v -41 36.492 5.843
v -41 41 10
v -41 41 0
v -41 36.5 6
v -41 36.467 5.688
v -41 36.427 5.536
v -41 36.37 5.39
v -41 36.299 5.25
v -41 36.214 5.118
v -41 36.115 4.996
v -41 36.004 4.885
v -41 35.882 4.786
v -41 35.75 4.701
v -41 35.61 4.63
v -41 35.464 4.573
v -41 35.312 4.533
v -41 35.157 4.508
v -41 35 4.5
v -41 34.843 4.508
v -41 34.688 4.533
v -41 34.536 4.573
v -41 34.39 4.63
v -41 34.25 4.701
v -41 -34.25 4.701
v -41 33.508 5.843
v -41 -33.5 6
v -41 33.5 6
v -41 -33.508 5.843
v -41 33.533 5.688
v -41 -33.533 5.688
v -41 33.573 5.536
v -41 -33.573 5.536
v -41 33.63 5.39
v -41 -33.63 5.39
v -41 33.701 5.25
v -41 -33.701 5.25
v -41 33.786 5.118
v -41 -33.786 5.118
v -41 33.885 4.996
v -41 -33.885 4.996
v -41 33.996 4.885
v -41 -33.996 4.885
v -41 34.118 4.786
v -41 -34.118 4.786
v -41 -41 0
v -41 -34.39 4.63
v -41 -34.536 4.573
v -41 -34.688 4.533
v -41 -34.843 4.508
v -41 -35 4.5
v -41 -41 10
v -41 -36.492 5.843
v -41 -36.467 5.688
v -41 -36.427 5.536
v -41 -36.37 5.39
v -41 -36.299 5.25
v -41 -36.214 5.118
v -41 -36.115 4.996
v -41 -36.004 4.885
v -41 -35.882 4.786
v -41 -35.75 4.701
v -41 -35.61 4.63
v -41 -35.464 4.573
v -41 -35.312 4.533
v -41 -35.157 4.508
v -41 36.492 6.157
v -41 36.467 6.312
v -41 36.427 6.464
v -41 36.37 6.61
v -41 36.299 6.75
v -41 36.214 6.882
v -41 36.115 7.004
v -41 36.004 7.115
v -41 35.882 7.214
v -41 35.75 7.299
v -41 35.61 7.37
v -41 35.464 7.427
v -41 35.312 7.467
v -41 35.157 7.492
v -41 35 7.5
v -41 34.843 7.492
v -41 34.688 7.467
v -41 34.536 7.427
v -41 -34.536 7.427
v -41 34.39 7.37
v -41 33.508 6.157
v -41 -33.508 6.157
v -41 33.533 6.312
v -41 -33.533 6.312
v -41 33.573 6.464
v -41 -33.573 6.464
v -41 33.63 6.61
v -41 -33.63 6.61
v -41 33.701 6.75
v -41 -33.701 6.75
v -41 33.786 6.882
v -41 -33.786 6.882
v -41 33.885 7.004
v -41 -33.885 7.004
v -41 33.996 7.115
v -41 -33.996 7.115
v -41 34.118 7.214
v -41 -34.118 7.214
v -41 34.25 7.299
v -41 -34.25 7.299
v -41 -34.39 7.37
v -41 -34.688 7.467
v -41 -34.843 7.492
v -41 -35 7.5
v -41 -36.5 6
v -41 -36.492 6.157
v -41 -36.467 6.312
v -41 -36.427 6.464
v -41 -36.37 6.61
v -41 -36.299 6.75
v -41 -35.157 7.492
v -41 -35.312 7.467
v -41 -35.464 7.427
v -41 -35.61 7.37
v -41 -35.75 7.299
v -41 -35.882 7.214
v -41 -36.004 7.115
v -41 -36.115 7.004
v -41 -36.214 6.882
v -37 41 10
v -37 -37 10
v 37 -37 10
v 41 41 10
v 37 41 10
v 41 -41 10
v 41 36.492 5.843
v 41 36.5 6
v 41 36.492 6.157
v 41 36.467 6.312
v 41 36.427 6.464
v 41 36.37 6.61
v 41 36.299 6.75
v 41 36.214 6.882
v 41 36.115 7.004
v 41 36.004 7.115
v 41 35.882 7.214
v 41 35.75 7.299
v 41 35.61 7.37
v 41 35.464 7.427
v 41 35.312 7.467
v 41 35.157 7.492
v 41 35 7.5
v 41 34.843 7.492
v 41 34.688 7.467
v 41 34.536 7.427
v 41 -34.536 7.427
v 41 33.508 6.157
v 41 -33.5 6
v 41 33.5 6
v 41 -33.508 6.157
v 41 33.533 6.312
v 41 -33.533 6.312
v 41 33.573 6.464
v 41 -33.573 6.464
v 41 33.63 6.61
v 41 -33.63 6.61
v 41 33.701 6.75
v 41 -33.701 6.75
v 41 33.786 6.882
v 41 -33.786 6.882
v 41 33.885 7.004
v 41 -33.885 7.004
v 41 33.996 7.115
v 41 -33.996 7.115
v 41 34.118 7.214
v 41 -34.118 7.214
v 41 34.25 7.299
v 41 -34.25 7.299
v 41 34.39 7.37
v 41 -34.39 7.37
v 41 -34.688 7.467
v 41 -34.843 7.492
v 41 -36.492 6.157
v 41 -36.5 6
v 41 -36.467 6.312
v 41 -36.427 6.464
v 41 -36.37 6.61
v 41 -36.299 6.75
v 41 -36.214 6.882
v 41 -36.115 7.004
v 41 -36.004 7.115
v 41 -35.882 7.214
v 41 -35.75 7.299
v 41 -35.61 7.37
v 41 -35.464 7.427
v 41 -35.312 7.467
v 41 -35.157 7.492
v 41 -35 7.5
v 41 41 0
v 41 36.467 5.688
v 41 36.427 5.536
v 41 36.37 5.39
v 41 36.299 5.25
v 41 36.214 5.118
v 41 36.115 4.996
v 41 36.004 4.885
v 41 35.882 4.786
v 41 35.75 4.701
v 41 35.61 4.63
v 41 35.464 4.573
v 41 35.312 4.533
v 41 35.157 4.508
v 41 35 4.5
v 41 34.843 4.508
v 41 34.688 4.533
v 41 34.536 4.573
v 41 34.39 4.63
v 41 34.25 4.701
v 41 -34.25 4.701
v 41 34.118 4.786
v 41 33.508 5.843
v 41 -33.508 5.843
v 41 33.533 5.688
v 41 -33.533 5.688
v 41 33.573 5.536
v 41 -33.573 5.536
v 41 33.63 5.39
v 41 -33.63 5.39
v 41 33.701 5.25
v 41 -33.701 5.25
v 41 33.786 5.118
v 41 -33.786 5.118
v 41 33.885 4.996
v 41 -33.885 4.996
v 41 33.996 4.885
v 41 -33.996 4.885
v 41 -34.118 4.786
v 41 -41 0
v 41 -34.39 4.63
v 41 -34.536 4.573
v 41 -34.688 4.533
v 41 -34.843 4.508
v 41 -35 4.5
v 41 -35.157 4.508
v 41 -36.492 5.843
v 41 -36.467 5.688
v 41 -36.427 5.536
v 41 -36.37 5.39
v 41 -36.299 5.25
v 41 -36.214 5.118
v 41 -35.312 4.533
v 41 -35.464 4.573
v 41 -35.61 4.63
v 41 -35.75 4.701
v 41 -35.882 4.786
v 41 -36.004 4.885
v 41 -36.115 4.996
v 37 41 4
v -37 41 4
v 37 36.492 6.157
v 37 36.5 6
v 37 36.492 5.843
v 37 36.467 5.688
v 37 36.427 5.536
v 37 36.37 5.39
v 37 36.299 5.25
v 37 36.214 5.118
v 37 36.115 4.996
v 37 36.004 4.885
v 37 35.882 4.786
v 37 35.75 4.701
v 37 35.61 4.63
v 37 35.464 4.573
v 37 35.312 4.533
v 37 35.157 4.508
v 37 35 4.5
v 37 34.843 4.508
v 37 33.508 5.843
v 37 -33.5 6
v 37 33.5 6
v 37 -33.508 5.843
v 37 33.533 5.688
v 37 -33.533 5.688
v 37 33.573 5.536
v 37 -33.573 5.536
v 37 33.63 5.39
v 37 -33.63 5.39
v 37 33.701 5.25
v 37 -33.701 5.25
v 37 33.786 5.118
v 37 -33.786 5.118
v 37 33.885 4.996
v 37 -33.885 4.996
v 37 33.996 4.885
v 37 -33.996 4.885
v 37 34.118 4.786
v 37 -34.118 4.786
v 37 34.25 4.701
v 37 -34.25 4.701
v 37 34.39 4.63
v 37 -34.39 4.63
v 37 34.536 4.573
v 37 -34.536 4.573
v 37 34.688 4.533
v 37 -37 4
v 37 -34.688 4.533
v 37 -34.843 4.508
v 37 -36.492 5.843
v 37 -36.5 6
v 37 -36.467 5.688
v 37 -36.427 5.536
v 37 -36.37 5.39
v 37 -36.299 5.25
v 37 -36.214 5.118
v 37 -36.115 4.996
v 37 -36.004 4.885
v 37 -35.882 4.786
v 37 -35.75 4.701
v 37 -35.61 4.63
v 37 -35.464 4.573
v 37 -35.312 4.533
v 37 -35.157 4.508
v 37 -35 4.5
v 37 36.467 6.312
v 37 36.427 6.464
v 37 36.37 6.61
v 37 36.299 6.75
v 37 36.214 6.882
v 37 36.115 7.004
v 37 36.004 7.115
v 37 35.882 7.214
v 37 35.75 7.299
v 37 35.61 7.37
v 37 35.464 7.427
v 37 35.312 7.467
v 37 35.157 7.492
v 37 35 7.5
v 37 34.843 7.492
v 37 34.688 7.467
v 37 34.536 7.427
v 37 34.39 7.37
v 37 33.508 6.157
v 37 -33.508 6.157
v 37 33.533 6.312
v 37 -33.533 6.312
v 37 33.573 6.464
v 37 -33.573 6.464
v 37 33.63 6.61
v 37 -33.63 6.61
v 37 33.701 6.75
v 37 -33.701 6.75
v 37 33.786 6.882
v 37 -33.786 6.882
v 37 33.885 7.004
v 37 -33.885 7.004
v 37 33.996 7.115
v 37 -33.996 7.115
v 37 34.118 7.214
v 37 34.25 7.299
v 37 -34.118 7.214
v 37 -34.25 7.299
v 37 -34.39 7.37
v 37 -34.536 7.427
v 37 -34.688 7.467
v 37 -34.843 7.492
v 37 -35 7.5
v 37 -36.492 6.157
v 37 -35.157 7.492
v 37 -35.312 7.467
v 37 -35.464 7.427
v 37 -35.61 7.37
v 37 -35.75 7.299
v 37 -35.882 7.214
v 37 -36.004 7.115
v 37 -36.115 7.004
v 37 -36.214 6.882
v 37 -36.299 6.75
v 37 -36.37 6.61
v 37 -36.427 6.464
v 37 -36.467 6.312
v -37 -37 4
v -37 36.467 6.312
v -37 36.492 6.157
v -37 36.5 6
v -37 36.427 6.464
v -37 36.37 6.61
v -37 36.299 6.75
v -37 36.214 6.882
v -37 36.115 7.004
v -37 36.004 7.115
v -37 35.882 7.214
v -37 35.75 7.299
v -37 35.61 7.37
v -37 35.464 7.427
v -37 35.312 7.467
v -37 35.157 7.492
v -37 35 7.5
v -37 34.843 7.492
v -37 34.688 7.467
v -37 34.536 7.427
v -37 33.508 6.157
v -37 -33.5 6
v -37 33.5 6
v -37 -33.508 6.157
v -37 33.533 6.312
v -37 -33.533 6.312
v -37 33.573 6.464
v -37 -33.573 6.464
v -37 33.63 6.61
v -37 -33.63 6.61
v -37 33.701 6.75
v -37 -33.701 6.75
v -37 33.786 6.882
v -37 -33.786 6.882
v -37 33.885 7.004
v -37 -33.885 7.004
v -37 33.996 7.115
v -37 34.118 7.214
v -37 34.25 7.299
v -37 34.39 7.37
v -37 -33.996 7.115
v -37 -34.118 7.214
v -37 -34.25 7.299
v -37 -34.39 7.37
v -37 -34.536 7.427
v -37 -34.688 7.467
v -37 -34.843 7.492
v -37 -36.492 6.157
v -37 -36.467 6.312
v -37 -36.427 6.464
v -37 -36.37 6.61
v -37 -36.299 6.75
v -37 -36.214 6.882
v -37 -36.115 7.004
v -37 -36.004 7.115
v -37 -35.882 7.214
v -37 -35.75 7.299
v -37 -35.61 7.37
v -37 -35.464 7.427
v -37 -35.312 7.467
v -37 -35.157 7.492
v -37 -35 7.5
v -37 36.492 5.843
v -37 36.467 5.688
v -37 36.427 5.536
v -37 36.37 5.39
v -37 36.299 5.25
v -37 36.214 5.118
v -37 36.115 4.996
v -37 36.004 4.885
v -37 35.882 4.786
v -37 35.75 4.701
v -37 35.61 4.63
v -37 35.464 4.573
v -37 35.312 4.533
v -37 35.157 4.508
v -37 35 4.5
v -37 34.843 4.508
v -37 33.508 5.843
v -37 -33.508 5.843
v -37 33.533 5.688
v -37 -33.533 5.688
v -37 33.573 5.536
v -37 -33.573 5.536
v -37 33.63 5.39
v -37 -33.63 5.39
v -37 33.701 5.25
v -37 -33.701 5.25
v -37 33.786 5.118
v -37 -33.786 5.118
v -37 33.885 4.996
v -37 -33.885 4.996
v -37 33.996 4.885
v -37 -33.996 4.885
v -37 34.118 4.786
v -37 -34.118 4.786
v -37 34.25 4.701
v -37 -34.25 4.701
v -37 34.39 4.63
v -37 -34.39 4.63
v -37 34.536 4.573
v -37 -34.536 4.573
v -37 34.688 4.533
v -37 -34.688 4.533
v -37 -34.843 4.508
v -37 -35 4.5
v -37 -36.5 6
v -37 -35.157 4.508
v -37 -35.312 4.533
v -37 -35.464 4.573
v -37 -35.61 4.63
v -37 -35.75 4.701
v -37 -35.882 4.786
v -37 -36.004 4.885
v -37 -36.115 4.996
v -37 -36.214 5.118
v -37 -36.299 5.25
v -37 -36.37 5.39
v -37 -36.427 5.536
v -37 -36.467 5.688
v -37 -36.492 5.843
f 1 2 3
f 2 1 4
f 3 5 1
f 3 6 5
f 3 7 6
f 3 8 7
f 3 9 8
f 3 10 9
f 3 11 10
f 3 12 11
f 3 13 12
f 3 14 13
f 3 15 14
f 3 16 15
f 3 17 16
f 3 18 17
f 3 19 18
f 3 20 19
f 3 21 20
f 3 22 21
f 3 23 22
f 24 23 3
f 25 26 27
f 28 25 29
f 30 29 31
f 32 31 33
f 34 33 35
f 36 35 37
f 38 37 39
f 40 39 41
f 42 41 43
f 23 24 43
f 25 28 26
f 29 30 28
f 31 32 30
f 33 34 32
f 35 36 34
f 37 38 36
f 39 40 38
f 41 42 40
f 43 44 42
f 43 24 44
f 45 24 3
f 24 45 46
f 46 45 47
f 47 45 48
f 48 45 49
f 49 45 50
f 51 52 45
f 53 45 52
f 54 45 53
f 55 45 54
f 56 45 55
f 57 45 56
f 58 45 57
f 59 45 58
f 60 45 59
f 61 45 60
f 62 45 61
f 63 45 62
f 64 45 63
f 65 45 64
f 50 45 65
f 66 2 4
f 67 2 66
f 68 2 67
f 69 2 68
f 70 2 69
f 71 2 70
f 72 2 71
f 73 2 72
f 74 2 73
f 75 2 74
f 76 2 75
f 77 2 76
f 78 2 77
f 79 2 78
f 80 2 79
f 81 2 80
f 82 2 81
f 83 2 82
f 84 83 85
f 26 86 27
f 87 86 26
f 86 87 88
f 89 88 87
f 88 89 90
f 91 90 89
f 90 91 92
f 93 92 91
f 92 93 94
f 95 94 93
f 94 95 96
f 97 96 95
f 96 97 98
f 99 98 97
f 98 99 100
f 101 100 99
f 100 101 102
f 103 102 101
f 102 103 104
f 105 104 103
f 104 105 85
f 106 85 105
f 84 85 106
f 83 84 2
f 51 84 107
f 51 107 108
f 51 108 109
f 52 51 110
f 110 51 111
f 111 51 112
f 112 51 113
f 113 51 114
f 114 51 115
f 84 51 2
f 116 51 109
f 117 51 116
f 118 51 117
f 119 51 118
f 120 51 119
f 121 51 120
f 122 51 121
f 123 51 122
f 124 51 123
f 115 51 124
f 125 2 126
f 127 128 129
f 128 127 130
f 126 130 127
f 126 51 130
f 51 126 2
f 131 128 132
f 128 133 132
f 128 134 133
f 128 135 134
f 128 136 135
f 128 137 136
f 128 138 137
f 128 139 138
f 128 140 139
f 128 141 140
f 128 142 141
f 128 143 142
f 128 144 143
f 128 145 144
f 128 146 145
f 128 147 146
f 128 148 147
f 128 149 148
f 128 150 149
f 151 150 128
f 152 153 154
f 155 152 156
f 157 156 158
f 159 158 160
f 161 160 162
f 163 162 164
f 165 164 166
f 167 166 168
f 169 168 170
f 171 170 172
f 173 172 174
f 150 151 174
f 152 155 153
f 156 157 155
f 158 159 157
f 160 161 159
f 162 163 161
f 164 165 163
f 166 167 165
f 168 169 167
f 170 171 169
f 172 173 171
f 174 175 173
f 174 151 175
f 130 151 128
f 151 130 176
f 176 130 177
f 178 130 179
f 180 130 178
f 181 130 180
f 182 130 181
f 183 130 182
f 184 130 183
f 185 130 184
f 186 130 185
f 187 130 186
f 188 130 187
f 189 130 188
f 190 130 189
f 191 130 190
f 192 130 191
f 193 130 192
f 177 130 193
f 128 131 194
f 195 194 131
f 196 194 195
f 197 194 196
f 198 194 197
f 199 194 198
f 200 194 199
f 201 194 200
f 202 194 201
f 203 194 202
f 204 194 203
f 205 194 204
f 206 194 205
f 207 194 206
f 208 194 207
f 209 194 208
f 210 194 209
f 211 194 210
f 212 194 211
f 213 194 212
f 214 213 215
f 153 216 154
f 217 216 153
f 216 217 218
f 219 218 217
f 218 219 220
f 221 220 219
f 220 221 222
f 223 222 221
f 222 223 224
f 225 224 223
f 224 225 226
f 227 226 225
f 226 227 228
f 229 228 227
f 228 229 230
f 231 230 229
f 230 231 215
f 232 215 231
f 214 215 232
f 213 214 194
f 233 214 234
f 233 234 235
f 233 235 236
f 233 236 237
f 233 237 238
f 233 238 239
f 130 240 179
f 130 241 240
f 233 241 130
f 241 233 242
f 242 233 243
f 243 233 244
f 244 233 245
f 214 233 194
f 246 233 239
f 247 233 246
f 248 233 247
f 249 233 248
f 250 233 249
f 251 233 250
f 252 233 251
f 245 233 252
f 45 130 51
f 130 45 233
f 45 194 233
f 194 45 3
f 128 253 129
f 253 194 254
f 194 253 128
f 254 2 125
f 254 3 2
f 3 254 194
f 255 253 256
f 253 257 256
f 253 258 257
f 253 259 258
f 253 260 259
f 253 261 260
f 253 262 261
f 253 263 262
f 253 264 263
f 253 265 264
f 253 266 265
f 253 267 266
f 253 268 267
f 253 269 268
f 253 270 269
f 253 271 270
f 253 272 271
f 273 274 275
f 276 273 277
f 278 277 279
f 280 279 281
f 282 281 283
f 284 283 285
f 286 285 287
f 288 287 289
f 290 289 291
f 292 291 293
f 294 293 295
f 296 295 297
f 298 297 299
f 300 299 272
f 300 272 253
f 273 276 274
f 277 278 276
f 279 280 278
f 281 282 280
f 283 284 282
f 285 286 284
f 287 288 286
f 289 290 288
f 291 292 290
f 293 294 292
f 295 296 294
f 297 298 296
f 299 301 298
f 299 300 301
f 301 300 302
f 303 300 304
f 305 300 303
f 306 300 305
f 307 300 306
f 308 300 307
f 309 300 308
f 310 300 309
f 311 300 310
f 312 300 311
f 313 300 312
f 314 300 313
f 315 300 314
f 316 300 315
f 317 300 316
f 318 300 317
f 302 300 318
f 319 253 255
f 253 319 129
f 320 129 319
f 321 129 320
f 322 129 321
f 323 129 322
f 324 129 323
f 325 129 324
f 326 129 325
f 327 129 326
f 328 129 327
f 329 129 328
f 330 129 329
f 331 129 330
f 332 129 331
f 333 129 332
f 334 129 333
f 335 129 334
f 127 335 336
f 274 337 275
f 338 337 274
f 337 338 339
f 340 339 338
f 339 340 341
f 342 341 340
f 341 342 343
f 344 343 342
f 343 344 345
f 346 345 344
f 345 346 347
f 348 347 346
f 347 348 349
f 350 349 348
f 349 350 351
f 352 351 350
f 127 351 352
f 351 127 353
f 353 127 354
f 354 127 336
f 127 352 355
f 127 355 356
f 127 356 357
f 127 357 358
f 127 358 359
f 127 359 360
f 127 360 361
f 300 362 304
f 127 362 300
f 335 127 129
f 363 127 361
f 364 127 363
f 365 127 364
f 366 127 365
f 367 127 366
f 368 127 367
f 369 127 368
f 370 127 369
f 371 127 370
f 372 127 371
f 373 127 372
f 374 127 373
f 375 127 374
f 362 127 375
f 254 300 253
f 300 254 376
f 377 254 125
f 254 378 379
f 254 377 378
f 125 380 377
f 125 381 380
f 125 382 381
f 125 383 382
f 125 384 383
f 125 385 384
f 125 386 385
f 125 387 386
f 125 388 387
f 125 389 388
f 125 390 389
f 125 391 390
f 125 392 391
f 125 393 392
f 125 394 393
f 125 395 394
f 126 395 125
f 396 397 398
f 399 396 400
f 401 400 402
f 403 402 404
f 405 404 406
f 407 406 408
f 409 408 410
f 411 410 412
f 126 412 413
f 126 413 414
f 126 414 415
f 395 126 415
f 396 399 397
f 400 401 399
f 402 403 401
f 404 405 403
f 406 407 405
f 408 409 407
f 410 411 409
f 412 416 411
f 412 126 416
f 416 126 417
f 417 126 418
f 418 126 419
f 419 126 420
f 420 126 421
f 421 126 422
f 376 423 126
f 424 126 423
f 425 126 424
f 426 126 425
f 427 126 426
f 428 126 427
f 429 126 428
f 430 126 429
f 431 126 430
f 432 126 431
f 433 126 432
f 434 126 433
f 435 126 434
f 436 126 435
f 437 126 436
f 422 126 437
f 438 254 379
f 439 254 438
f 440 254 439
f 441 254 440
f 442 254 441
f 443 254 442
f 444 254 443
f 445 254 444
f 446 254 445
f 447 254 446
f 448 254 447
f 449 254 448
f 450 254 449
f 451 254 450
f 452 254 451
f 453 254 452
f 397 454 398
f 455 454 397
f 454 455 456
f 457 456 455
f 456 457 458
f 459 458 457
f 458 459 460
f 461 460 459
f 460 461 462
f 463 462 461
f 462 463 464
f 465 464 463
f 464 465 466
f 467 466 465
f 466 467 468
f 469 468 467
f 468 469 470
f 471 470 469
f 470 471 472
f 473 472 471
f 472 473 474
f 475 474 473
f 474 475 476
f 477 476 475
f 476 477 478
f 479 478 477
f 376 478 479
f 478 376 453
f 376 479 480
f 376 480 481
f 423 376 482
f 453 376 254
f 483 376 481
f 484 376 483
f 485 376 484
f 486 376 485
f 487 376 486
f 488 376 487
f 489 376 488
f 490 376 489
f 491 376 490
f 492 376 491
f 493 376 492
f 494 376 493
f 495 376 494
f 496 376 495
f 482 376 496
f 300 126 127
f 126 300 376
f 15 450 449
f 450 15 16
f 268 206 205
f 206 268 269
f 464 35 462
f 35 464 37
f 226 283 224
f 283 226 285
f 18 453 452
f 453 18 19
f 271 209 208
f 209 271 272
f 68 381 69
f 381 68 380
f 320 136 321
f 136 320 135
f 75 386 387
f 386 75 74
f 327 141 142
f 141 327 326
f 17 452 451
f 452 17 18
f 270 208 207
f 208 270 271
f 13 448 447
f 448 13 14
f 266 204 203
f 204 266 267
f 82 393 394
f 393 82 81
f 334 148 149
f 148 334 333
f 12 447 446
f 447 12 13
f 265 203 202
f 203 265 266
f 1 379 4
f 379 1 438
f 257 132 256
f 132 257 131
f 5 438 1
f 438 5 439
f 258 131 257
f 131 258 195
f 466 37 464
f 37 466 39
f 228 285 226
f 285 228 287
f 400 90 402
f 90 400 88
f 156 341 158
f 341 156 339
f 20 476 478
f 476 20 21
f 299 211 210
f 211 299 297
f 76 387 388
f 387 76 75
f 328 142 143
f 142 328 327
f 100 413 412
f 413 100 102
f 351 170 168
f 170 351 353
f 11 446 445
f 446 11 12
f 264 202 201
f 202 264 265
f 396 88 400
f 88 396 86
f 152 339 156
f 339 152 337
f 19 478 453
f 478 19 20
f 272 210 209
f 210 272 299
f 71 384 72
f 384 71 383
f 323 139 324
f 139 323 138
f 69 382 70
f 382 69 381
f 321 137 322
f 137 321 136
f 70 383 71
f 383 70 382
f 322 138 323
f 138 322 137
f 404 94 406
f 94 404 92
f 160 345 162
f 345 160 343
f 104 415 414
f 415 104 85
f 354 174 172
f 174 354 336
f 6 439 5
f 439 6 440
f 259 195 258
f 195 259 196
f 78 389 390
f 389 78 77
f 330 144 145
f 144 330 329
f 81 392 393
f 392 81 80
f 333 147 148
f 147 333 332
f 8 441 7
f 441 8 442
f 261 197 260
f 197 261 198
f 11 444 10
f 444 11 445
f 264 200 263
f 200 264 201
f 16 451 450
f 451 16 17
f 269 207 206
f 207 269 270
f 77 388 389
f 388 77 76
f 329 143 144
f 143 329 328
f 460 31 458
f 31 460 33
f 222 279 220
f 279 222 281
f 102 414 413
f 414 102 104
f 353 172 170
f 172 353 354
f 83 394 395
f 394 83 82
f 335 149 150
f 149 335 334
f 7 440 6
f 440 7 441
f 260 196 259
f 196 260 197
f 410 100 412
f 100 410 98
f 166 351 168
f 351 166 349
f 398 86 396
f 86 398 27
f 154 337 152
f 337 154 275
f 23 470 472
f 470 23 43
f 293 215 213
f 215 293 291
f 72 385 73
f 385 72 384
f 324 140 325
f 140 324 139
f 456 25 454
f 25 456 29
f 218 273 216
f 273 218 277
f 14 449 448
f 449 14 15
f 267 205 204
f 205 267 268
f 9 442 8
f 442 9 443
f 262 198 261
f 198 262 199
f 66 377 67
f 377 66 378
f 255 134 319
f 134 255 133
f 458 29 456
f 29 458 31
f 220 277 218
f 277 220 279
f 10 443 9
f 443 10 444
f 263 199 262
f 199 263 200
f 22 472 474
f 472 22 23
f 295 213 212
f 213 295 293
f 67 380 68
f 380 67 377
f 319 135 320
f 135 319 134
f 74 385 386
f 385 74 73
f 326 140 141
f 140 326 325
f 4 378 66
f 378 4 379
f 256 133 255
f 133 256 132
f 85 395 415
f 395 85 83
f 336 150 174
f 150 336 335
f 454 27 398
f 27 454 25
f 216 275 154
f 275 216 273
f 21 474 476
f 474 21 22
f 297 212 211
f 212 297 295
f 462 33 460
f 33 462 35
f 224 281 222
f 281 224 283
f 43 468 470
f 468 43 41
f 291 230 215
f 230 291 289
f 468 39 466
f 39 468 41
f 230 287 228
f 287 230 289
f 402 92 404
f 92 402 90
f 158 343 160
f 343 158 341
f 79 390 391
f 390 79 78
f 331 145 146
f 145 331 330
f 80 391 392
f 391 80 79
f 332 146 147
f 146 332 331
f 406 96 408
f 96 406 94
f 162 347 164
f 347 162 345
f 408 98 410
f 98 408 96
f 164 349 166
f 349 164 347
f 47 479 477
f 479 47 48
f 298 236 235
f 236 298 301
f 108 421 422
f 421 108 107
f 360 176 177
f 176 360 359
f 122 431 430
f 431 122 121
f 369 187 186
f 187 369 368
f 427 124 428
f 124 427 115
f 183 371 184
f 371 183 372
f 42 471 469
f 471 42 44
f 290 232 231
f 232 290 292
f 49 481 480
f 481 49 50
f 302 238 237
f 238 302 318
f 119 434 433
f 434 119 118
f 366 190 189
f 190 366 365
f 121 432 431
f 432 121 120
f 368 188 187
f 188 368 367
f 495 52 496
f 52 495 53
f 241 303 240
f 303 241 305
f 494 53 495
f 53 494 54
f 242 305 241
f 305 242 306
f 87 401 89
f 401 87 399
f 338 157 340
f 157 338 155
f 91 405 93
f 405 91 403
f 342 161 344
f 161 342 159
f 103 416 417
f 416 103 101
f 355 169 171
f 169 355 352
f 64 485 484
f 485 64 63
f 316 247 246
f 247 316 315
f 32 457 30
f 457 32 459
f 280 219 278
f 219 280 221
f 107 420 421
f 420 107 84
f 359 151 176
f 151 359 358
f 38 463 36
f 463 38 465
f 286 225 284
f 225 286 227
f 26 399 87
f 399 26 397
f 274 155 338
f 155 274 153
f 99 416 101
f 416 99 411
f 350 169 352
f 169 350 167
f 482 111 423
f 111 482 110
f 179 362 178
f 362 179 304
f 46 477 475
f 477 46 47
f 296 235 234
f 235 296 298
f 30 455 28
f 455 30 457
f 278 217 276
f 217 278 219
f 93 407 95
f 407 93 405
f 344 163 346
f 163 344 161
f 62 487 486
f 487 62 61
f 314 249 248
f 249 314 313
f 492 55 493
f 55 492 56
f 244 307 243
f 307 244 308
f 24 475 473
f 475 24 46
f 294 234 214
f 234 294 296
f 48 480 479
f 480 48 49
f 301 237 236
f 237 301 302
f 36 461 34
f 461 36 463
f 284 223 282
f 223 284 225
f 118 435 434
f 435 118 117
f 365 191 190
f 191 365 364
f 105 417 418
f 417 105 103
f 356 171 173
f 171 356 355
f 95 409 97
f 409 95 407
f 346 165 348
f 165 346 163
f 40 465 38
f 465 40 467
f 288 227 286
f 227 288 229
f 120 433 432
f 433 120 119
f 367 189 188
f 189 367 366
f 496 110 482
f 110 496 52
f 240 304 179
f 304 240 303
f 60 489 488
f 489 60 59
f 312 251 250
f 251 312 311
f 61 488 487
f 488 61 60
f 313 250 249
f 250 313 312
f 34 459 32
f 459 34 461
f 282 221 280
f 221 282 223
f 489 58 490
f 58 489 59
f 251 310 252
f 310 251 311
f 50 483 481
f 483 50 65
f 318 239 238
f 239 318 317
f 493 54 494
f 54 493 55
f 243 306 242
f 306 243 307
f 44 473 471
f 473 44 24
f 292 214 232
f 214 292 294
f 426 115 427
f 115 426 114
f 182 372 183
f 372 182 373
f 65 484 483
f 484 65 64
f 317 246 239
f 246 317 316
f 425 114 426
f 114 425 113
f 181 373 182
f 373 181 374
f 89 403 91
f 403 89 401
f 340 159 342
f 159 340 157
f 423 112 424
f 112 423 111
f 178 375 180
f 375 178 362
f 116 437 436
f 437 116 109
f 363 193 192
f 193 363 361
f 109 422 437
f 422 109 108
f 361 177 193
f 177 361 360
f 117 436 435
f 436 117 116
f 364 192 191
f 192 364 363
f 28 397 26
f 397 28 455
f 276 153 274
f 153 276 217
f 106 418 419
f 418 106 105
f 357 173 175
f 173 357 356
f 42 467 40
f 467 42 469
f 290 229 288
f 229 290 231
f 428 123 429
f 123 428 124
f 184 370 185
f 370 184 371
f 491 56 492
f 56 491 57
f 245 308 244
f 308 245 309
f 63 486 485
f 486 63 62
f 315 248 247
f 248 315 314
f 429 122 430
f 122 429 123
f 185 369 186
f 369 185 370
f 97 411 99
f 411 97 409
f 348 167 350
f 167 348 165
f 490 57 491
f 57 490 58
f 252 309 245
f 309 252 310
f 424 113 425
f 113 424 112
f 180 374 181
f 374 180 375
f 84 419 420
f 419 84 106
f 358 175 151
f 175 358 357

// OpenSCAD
use <../config.scad>

gps_l = 70;
gps_lg = 70;
$fn=60;

h = 10;

module gps(){
    difference(){
        hull(){
            translate([-gps_l/2-6,-gps_l/2-6,0])cube([gps_l+12, gps_l+12,h]);
        }
        translate([-gps_l/2-2,-gps_l/2-2,h-6])cube([gps_l+4, gps_l+12,h]);
        
        translate([0, gps_l/2,h-4])rotate([0,90,0])cylinder(r=1.5,100, center = true);
        translate([0, -gps_l/2,h-4])rotate([0,90,0])cylinder(r=1.5,100, center = true);
    }
    %union(){
        translate([0,0,25])cube([gps_l+10, gps_l+10,1], center = true);
        translate([-gps_l/2,  gps_l/2,20])cylinder(r=1.5,20, center = true);
        translate([-gps_l/2, -gps_l/2,20])cylinder(r=1.5,20, center = true);
        translate([ gps_l/2,  gps_l/2,20])cylinder(r=1.5,20, center = true);
        translate([ gps_l/2, -gps_l/2,20])cylinder(r=1.5,20, center = true);
    }
}

gps();
